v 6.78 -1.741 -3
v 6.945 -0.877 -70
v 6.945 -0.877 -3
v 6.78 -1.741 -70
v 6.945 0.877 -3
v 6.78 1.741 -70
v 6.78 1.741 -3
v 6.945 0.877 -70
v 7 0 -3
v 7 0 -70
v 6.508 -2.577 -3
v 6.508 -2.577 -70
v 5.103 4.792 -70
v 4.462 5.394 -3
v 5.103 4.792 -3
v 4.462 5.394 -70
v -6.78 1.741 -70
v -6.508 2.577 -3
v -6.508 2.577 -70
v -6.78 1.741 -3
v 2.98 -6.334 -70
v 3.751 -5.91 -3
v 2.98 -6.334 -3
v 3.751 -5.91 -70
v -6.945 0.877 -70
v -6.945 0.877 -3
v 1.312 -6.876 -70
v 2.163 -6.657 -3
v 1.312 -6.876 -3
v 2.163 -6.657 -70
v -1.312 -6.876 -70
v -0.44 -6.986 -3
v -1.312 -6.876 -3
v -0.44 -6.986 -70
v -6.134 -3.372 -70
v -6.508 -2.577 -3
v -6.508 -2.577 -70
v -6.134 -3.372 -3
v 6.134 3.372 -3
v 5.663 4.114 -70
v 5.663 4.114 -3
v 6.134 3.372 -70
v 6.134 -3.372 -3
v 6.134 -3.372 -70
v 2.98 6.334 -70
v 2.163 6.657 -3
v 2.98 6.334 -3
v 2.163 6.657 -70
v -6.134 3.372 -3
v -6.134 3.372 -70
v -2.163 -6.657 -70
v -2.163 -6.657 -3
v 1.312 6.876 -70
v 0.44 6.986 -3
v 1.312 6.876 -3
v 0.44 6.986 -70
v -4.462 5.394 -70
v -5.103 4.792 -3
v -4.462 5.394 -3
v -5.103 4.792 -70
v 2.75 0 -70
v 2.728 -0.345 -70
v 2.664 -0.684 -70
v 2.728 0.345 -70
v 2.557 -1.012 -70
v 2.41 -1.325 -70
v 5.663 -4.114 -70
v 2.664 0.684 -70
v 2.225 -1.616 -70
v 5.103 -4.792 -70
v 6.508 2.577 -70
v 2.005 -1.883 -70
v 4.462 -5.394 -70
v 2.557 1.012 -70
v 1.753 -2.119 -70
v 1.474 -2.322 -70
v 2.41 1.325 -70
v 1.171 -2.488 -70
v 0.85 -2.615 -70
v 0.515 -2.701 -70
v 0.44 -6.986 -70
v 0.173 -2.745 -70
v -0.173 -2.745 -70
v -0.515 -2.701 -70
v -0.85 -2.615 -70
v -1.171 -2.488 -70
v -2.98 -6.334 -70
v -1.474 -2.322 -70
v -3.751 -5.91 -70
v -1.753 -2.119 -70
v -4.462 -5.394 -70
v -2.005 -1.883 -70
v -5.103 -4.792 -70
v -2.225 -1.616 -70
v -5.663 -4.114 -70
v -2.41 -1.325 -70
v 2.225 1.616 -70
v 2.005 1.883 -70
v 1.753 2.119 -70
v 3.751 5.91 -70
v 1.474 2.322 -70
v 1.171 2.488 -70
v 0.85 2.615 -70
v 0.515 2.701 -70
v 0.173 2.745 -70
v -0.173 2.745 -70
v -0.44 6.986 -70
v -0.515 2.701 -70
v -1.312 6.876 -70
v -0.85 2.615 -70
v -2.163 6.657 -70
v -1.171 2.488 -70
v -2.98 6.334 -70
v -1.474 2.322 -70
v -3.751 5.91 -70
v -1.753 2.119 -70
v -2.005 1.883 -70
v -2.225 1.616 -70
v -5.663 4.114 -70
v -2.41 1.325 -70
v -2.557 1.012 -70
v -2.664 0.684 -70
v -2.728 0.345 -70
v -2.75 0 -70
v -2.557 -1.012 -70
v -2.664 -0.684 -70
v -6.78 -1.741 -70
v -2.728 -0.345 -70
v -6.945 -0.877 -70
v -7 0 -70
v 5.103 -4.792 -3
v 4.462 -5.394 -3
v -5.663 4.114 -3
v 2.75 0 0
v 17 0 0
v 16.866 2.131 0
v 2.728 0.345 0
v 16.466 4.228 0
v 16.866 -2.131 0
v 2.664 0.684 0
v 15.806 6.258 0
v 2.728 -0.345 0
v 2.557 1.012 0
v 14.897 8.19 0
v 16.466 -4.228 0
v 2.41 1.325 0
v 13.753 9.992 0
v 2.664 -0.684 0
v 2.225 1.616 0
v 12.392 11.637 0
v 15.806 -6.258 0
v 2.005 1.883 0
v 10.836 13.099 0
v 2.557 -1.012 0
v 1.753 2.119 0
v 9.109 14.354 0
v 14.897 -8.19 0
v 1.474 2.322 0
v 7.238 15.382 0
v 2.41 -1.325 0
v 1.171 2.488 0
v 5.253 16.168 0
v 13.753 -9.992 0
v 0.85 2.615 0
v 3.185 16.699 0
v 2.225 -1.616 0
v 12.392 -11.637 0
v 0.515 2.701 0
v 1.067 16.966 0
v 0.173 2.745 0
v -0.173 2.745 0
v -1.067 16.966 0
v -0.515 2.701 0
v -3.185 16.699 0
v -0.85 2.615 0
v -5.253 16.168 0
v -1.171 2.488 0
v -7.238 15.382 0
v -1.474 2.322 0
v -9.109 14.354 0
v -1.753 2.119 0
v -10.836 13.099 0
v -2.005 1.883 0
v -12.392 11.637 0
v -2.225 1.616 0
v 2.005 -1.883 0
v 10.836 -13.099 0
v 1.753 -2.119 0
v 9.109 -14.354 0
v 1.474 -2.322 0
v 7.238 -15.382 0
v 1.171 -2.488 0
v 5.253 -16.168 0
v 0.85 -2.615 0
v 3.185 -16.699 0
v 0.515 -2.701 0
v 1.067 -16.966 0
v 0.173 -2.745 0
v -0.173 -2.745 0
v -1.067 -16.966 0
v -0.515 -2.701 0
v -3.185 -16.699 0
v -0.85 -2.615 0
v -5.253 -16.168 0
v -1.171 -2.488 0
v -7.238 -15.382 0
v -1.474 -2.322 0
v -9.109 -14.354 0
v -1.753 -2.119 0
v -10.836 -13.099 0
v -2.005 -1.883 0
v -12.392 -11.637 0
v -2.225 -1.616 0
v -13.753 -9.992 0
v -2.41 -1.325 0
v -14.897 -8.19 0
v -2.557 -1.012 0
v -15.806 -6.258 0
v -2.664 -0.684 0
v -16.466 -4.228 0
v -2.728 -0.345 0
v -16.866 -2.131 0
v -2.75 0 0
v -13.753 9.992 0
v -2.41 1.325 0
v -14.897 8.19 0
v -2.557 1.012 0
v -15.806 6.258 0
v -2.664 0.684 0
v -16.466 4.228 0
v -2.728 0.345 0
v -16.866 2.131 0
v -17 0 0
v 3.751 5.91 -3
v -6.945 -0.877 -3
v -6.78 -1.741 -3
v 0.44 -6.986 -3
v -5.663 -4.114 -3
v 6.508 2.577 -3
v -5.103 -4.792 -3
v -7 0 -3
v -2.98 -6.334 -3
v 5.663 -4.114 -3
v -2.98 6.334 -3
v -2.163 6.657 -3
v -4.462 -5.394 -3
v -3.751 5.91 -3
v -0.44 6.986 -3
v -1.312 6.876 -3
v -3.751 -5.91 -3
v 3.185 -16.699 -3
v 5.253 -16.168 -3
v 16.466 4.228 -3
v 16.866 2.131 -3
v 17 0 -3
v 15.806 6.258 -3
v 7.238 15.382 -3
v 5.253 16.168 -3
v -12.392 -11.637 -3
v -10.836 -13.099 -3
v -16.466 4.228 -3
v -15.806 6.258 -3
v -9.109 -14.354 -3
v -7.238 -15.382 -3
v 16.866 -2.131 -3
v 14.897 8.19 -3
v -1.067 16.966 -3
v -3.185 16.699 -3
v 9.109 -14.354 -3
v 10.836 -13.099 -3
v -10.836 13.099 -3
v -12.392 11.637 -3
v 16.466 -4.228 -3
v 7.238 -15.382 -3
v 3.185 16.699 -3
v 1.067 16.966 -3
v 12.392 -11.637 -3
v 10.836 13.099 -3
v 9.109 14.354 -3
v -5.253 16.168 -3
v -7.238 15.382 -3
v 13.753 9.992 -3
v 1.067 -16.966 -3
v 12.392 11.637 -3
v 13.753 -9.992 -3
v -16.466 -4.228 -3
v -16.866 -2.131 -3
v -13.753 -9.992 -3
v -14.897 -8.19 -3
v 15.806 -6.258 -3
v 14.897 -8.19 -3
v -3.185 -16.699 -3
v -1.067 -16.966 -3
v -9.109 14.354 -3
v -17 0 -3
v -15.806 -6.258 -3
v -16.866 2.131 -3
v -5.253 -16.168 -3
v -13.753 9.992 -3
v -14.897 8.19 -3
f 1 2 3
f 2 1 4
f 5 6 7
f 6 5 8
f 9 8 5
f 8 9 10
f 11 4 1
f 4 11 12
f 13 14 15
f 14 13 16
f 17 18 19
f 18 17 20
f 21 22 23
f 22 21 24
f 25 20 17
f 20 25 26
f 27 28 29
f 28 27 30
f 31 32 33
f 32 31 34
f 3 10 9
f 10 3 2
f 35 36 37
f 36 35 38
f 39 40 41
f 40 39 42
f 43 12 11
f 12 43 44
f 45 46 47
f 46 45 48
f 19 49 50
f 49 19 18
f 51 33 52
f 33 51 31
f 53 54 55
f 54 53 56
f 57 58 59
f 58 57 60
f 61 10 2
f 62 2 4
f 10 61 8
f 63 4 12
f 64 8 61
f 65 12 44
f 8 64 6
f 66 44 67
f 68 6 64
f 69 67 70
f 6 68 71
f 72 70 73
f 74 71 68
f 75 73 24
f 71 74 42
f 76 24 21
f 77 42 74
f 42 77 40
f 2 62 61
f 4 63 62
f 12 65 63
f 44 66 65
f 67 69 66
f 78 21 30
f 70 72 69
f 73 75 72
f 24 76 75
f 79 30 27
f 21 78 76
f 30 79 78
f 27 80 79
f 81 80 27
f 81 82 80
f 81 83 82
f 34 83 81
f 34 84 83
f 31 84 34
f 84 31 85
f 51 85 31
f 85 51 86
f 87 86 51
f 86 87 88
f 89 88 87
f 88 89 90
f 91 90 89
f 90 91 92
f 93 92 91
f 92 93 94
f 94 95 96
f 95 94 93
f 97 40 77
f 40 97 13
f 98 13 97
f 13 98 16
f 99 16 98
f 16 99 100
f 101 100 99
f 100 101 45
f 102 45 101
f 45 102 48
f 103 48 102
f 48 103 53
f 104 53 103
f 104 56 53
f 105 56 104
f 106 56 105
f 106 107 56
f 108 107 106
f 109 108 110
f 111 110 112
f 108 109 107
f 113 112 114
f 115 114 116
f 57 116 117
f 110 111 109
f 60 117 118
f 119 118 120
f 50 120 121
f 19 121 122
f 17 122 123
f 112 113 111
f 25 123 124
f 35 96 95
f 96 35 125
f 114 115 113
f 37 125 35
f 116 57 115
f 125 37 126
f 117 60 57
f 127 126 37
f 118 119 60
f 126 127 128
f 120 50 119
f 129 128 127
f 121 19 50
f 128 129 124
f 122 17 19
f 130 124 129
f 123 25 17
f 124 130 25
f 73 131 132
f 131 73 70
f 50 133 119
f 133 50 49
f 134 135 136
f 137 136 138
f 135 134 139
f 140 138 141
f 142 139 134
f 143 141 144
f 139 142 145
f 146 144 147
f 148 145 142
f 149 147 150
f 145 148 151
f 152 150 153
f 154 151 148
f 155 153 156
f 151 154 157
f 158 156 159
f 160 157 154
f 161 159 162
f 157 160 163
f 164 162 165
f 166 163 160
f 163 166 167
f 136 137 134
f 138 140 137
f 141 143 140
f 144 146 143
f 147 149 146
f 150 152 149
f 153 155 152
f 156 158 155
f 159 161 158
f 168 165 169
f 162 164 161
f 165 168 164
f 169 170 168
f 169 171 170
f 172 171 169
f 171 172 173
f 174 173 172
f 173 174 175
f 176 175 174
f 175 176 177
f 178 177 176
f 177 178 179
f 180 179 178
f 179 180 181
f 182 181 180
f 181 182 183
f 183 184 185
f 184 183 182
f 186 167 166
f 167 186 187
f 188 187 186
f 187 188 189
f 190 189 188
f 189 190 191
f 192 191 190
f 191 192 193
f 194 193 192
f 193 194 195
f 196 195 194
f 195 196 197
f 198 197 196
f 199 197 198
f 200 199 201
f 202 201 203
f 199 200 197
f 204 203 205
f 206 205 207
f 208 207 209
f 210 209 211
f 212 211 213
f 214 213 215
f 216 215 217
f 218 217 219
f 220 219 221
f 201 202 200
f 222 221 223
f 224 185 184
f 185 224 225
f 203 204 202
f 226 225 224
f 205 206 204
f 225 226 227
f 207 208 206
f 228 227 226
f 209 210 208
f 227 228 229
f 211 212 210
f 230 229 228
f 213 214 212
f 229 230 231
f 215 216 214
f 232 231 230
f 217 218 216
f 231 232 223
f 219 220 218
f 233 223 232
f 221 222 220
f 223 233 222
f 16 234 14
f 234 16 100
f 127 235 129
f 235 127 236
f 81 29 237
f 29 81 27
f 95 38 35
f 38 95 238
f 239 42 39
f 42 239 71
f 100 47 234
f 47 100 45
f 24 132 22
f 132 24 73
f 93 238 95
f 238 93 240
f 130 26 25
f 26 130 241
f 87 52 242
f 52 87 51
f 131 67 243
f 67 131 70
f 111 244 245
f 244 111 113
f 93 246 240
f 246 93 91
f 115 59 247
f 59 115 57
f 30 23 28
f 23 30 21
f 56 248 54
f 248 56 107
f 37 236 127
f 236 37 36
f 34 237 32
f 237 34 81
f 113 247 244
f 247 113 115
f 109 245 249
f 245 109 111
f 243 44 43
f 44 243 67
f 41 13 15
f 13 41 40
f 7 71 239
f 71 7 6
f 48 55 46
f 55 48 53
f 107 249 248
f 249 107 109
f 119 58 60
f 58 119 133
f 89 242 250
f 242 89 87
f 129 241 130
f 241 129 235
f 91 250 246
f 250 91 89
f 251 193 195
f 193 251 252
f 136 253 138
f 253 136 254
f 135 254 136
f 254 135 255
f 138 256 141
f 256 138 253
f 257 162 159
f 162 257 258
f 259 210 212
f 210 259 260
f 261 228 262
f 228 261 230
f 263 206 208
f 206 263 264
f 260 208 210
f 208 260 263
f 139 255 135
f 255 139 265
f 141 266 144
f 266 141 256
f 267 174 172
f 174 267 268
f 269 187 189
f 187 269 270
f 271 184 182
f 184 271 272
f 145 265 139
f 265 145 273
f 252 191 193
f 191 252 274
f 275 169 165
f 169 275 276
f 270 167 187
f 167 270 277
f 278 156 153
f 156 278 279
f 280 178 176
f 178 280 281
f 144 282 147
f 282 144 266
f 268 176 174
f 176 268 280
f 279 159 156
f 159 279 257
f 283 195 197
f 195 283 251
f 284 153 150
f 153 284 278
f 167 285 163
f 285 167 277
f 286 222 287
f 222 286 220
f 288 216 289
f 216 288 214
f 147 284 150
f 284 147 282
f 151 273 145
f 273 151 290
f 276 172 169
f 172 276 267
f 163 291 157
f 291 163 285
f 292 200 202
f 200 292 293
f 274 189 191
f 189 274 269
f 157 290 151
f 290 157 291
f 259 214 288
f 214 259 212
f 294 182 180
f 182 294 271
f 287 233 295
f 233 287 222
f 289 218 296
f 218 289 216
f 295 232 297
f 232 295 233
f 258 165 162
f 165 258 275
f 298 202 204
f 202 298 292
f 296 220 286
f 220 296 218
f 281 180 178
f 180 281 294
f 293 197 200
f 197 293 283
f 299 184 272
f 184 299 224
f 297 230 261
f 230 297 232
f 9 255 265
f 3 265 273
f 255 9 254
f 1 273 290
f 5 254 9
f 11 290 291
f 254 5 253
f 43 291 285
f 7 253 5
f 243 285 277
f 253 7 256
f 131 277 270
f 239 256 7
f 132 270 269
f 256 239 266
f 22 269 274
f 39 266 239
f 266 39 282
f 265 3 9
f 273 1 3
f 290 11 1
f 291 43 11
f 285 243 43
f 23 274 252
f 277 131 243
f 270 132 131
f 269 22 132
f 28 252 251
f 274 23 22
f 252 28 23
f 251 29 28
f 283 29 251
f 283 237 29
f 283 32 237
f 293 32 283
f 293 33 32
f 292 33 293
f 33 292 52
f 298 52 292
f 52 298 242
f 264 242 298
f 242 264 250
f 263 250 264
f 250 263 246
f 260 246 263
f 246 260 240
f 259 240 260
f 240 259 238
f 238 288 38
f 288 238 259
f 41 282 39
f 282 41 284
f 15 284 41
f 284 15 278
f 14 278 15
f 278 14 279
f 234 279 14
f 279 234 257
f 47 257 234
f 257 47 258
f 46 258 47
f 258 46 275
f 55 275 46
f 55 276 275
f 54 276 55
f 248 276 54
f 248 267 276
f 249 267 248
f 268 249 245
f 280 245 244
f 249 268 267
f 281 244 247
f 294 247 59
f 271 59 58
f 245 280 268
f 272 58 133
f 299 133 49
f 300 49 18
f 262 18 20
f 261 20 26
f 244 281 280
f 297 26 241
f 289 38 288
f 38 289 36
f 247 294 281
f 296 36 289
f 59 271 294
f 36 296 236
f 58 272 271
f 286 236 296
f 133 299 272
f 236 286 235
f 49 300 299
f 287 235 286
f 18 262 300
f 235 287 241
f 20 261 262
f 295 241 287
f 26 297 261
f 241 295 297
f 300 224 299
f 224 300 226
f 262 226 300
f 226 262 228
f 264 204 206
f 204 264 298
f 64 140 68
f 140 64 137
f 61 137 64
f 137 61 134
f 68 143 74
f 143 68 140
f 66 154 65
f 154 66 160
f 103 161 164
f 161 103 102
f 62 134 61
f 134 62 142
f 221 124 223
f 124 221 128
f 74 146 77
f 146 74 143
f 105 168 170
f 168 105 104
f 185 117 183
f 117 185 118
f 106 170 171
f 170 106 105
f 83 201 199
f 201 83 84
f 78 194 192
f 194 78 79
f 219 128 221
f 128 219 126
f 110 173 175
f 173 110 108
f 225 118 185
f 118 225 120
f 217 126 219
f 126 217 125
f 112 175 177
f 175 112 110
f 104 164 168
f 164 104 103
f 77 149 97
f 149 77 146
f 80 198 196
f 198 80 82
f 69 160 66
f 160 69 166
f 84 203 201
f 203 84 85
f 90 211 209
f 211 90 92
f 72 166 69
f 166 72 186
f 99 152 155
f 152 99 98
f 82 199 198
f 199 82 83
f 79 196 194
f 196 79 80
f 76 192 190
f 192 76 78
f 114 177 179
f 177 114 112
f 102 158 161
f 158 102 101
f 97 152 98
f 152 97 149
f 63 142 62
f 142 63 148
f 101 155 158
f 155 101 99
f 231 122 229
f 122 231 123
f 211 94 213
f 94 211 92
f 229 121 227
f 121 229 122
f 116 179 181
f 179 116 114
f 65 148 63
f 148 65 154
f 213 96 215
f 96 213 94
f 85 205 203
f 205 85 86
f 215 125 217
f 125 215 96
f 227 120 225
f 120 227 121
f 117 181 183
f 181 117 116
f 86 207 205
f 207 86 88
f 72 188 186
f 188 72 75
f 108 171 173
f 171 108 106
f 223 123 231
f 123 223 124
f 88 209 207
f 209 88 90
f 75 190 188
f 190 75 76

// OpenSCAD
$fn = 50;


difference() {
	union() {
		translate(v = [0, 0, -70.0000000000]) {
			cylinder(h = 70, r = 7.0000000000);
		}
		translate(v = [0, 0, -3.0000000000]) {
			cylinder(h = 3, r = 17.0000000000);
		}
	}
	union() {
		#translate(v = [0, 0, -70]) {
			cylinder(h = 70, r = 2.7500000000);
		}
	}
}
